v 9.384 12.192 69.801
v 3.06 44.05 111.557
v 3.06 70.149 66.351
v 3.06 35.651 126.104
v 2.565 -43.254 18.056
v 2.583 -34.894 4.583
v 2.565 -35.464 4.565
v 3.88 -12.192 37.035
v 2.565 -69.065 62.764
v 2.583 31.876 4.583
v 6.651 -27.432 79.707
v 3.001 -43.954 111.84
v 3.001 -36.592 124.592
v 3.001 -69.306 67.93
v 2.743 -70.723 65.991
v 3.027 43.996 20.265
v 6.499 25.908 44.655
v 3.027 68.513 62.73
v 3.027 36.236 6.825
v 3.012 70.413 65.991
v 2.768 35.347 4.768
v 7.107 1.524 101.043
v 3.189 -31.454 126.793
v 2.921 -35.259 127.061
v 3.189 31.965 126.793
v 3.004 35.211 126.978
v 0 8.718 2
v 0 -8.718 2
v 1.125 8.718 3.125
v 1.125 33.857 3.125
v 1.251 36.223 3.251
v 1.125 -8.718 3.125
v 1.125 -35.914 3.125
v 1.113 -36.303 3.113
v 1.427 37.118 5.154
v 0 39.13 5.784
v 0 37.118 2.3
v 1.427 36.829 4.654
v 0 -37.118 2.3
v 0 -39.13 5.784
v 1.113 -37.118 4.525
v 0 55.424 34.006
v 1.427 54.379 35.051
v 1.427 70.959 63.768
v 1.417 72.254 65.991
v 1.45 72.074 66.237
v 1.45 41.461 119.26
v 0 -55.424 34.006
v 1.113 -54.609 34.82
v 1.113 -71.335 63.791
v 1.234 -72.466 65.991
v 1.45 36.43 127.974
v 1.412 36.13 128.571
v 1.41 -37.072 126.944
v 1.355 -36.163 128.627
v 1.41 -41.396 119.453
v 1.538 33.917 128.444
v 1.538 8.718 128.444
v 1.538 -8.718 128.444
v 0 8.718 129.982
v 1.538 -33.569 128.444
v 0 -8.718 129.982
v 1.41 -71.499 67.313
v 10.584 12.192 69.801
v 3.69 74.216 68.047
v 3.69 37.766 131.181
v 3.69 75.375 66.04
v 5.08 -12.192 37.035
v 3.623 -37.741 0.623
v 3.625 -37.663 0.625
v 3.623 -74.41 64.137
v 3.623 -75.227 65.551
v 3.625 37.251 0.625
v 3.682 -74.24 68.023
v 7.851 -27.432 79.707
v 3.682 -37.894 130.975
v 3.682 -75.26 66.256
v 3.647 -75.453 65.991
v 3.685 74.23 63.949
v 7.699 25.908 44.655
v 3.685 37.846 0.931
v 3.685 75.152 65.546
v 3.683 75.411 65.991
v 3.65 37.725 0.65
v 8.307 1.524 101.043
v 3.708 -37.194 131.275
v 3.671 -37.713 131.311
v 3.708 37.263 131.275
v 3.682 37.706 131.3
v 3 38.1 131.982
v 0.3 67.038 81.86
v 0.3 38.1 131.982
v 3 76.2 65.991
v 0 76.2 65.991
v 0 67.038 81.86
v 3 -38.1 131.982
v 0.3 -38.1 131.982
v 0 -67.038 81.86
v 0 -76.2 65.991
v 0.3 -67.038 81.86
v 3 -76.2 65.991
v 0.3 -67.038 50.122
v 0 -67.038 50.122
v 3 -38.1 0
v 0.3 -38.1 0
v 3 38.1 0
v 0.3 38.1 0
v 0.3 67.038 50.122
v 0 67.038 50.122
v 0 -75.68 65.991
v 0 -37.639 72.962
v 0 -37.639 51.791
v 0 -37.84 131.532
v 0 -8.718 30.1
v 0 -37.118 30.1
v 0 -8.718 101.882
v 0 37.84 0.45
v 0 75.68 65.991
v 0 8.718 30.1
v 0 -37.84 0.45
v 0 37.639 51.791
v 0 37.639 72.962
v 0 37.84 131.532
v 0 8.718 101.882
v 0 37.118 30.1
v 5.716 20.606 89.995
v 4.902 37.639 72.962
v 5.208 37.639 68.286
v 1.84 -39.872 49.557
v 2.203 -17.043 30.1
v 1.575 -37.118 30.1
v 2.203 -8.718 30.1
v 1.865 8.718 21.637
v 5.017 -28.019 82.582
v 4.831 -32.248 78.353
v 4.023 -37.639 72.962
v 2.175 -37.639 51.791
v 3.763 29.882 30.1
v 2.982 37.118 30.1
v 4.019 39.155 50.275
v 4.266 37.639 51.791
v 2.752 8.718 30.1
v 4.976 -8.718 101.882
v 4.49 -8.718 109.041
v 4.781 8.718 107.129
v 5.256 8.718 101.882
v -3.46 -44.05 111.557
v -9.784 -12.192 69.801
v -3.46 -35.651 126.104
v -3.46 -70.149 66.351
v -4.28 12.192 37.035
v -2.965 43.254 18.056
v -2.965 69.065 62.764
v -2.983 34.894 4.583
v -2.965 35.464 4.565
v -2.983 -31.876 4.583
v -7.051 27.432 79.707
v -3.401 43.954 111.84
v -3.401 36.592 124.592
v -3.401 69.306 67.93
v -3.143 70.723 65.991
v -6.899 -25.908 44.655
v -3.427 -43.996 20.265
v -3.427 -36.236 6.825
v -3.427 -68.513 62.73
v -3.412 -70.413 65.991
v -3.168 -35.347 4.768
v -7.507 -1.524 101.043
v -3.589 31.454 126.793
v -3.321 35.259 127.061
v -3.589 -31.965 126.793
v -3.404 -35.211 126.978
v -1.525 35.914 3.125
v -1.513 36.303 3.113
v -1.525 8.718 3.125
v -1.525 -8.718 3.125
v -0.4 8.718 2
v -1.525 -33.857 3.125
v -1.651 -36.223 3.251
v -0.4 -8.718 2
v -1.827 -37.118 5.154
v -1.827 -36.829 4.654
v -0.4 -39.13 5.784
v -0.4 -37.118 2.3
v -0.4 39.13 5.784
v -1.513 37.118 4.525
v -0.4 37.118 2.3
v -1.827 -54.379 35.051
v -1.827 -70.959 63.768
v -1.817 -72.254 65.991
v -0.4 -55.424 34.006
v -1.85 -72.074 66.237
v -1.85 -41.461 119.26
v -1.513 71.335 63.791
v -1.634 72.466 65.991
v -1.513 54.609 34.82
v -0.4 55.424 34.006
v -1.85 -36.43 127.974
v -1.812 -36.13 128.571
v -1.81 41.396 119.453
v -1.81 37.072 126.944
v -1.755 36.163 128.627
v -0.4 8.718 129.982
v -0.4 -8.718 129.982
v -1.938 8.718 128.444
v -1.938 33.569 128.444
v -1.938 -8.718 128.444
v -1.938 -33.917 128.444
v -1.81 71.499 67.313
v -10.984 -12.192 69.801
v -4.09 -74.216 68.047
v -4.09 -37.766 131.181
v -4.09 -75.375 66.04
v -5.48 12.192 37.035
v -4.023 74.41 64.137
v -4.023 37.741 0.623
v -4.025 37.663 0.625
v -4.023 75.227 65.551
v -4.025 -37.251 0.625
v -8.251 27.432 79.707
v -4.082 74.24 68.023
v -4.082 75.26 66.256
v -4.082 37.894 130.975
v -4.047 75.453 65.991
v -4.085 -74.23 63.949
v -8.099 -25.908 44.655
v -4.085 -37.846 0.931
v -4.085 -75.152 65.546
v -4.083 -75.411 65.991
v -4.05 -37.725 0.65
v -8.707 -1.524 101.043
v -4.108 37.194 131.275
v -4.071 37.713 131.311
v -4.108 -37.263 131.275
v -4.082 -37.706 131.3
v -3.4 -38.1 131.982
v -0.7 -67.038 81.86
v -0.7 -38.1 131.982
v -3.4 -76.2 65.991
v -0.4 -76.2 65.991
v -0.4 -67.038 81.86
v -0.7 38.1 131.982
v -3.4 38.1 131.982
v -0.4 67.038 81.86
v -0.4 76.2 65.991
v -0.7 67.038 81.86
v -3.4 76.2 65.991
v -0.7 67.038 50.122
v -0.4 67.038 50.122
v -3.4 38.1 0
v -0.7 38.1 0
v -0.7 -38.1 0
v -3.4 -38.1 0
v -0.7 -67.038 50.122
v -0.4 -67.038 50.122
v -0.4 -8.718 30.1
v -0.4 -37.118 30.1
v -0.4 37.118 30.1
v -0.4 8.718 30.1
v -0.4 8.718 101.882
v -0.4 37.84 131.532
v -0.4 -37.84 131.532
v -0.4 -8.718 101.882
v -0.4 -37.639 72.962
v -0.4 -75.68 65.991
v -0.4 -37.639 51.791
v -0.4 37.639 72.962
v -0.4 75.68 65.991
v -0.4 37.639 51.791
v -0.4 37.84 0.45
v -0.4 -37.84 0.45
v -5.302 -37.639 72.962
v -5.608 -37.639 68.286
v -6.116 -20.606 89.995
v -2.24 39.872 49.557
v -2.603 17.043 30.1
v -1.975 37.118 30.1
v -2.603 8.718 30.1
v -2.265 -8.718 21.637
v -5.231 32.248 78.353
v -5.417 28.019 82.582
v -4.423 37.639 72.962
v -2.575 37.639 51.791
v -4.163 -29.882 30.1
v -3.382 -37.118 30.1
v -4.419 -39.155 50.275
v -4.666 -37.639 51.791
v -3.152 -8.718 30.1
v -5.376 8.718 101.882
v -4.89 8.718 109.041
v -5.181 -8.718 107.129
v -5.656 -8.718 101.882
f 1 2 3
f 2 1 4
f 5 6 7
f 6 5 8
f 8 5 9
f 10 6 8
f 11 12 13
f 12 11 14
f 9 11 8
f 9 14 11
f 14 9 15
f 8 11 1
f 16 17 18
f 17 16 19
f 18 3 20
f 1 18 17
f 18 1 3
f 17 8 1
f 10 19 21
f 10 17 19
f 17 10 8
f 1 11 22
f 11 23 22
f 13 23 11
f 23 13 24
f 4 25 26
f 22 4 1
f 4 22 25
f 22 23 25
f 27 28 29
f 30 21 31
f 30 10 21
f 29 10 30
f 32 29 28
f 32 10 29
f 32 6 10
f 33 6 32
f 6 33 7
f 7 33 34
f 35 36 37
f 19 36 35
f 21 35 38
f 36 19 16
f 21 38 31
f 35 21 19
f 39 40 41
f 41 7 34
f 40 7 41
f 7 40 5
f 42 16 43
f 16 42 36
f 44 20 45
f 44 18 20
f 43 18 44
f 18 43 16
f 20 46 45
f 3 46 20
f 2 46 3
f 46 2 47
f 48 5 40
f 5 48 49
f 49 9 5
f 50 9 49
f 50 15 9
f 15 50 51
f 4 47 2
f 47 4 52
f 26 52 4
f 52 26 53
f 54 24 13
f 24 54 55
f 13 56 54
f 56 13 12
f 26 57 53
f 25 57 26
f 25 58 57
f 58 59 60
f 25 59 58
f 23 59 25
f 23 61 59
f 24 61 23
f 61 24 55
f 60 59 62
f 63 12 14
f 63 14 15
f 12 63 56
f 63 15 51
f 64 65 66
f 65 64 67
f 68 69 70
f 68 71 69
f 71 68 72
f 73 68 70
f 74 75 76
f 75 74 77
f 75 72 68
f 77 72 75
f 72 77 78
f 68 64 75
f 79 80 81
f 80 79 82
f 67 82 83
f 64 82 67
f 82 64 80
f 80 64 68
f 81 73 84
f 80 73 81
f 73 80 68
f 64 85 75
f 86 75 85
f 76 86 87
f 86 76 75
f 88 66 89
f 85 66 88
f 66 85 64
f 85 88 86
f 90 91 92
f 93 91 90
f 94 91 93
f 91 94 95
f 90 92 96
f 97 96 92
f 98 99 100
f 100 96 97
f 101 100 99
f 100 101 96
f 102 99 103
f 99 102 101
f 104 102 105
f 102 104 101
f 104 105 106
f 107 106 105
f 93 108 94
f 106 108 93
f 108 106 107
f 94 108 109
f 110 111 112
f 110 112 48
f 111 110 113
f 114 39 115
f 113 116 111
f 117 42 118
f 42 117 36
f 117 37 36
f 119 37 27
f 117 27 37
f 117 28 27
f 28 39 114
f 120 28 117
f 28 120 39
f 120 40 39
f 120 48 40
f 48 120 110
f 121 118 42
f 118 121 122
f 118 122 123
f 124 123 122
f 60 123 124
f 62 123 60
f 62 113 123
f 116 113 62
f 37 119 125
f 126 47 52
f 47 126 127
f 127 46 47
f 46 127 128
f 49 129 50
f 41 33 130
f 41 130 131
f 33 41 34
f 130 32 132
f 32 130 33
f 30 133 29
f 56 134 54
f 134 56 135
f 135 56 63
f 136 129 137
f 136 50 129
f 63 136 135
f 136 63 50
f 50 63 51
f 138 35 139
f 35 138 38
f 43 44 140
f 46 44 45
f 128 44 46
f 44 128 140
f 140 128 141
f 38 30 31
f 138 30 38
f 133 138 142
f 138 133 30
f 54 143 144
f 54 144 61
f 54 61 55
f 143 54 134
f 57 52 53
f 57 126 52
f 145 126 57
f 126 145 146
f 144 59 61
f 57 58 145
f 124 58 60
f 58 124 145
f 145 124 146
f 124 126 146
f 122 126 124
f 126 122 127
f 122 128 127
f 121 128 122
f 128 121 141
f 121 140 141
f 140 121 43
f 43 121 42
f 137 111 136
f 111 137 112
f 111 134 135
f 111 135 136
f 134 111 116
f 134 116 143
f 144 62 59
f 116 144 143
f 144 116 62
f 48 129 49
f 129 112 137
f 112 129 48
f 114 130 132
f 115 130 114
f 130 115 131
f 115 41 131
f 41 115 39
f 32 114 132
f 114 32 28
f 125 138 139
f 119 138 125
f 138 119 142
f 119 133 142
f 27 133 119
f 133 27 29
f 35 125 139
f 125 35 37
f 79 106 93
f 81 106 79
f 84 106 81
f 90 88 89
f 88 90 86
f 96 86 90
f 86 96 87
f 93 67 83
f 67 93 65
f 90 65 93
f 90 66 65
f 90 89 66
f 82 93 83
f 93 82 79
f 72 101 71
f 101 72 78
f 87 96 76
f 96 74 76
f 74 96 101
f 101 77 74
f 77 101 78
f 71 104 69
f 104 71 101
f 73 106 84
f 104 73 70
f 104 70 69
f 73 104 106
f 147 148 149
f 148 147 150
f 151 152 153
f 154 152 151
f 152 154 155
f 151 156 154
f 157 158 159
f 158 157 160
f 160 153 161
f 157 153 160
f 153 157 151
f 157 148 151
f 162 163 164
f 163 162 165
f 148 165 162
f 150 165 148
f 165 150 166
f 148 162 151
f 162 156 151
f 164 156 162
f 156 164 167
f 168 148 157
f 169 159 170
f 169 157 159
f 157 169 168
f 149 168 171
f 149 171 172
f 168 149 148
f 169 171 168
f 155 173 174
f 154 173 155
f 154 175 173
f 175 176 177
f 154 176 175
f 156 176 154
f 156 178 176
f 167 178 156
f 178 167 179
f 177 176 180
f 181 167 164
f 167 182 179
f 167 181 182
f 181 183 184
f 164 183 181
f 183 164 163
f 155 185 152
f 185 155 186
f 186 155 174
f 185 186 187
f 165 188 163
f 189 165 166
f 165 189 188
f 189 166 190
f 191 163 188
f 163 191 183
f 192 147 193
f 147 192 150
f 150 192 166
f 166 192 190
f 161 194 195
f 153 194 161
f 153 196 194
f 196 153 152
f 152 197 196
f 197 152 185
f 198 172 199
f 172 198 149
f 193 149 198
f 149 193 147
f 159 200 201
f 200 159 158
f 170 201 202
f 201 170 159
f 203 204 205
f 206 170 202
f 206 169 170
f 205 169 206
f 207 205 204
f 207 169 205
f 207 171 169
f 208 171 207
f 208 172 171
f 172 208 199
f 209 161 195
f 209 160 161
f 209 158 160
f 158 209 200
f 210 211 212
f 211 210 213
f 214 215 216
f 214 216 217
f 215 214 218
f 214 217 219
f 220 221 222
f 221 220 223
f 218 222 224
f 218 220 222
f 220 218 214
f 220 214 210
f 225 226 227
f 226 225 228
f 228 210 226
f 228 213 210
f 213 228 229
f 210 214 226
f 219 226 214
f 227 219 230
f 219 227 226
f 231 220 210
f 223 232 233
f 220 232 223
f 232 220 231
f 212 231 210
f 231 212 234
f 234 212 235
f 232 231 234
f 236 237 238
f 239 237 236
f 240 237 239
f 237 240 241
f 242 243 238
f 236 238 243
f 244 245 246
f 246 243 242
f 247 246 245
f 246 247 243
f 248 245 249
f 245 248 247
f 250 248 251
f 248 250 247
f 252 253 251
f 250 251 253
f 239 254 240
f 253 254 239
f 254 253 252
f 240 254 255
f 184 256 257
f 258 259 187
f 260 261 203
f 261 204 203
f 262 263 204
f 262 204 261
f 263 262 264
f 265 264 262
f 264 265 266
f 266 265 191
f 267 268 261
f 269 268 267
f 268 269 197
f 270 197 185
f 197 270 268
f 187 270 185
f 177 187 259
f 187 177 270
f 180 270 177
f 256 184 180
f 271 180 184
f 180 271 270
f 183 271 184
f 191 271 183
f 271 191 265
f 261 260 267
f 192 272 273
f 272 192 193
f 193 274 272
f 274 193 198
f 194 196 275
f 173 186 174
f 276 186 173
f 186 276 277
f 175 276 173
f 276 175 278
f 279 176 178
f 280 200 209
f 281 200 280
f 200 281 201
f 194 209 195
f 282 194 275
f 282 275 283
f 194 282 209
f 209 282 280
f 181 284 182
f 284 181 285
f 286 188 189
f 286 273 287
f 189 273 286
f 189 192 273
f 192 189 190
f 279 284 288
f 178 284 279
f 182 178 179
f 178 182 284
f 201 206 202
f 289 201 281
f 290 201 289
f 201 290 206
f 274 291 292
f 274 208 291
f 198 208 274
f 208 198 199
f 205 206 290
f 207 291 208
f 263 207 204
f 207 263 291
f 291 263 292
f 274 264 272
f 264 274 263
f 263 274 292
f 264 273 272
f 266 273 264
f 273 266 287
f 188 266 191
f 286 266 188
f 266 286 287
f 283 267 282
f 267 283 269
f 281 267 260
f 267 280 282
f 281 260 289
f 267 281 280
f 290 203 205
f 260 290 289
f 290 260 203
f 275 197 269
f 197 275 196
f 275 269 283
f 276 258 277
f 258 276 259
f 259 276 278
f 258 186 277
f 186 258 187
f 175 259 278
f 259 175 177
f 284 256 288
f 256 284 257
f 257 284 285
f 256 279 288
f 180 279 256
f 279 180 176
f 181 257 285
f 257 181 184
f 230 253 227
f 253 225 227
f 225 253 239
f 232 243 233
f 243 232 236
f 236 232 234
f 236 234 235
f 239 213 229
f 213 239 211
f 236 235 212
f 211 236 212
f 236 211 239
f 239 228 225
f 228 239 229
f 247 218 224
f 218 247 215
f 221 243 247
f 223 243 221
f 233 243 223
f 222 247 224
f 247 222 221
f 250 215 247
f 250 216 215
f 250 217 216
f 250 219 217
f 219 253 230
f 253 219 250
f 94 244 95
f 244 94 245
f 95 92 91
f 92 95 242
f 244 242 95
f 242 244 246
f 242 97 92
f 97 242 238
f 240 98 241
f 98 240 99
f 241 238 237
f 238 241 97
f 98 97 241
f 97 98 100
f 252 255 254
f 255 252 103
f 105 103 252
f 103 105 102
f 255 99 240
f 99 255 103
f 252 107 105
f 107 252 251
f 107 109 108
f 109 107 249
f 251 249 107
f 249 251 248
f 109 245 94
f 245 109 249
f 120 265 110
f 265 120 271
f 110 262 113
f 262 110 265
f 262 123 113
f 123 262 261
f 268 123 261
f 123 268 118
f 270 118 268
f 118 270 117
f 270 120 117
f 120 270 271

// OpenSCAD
// Hexagon wall tile v44 — parametric rebuild of v30
// Front: identical low-poly facets to v30 (same facet angles at every size).
// Edge profile: identical on every size (edge depth, rim width) so tiles butt flush.
// Back: six corner pads for 1" (25 mm) double-sided mounting tape.
// v32: tape pads are flat plates hung from the rim with an air gap to the front skin.
// v33: thinner skin + thinner pads so the air gap is 1.4 mm even right at the edges
//      (v32 had only 0.8 mm there and showed marks along the slanted edges).
// v34: snap-off stabilizer fins behind the bottom edge so the tall, thin tile can't tip over
//      while printing. Break them off afterwards (bend sideways) and the back stays flat.
// v35: 0.6 mm 45° chamfer on the front edge (crisp, consistent shadow line between tiles; hides
//      first-layer squish and brim trim marks) + relief_scale to deepen the facets if wanted.
// v37: much smaller breakaway tabs (0.8 x 0.6 mm, every 8 mm) so the fins snap off easily.
// v38: full-height snap-off BRACE FRAME behind the tile: a thin hex ring + X/vertical bars,
//      1 mm behind the back, tied to the tile rim by tiny tabs all the way round (incl. the top).
//      Tile + brace act as a stiff box while printing; the fins now sit on the brace.
//      Peel the brace off after printing — the tabs only touch the back rim.
// v39: PAIR mode (default): two identical tiles printed back-to-back, 0.4 mm apart, so each
//      cradles the other full-height. Only 12 tiny tabs (corners + mid-sides) join the back
//      rims — twist/peel the tiles apart. No brace, no fins, almost no waste. The pair is
//      turned 90° on the bed so the 'back' seam lands on a side edge, not on either face.
// v40: pair tabs spaced evenly every ~pair_tab_pitch mm round the rim on EVERY size. In v39 the
//      tab spacing grew with the tile (3": ~23 mm max gap, 6": ~46 mm, 10": ~79 mm), so the 3" pair
//      printed perfectly but the 6" rims flexed apart between tabs and broke up above mid-height.
//      Now every size has the same tab spacing as a stiff 3" pair (or tighter).
// v42: tabs replaced by one continuous hairline SEAM round the outer edge of the pair gap.
//      Discrete tabs changed the toolpath on every layer that had a tab, leaving a faint line
//      across the tile every ~10 mm of height. With a continuous seam every layer has the same
//      shape, so there is nothing to print differently. Separate the tiles by running a utility
//      knife along the seam line on the edges, then twist apart.
// v43: stiffer tape pads — each pad now grows from the back plane toward the front until it is
//      pad_gap (1.4 mm) from the skin, instead of being a 1 mm plate (the skin stays untouched, so
//      no ghost lines). Larger tiles (>= mid_pad_min_in)
//      get four extra pads at the slanted mid-edges: 10 tape spots on the 10".
// v44: UNIFORM pads. Every pad is the same PAD x PAD tape square, pushed snug into its corner
//      (touching both rims), with only a small 45° gusset beneath it down to the rim so it prints
//      without support. Because a hex corner is the same angle at every size, the 6" and 10" pads
//      are identical in shape and size; the 3" uses the same layout with smaller squares.
//      The 10" adds the same square at the middle of each slanted edge.
// Prints upright on a flat edge with NO supports (every downward edge is 45° or steeper).
//
// Export one size at a time, e.g.:
//   openscad -D size_in=6 -o hex_pair_v44_6in.stl hex_wall_tile_v44.scad

/* [Size] */
size_in       = 6;      // point-to-point width in inches (3, 6, 10 ...)

/* [Edge profile — keep identical across sizes] */
// Space behind the skin at the edge = edge_depth - skin; it must be >= pad_plate + pad_gap + pad_recess.
edge_depth    = 3.6;    // depth of the outer edge, back plane to front face (mm)
rim           = 2.0;    // perimeter wall thickness at the back plane (mm)
front_chamfer = 0.6;    // 45° chamfer on the front edge (mm); 0 = sharp edge

/* [Look] */
relief_scale  = 1.0;    // 1.0 = v30 facets; 1.5 = 50% deeper facets (same edge profile on all sizes)

/* [Front skin] */
skin          = 1.2;    // front skin thickness (mm) — 3 lines at 0.4 mm, same on all sizes

/* [Tape pads] */
tape_width    = 25.4;   // tape width (mm)
pad_margin    = 3;      // extra pad width beyond the tape (mm)
pad_max_frac  = 0.45;   // pad never larger than this fraction of the tile radius (keeps 3" usable)
pad_plate     = 1.0;    // minimum pad thickness (mm) — at the very edge, where there is least room
pad_depth     = 7;      // pads grow toward the front up to this depth, but always stop pad_gap from the skin
mid_pad_min_in = 8;     // tiles this size or larger also get pads at the four slanted mid-edges
pad_gap       = 1.4;    // minimum air gap between pads and the front skin (mm) — keeps the front clean
pad_recess    = 0;      // pads set back from the rim (mm); >0 lets the rim touch the wall,
                        // but near the edges the plate is then trimmed thinner to keep pad_gap

/* [Print stabilizers (snap off after printing)] */
stabilizers   = false;  // v34-v38 option; not needed in pair mode
fin_count     = 2;      // fins behind the bottom edge, placed symmetrically
fin_thick     = 1.6;    // fin thickness (mm)
fin_height_frac = 0.35; // fin height as a fraction of the tile height
fin_depth_frac  = 0.4;  // fin depth behind the brace as a fraction of fin height
fin_depth_min   = 15;   // (mm)
fin_gap       = 0.5;    // air gap between fin and tile back (mm)
tab_height    = 0.6;    // breakaway tab height (mm, vertical when printing) — 3 layers at 0.2
tab_width     = 0.8;    // breakaway tab width (mm), centred on the fin — 2 lines
tab_pitch     = 8;      // spacing between tabs (mm)

/* [Full-height brace frame (snap off after printing)] */
brace         = false;  // v38 option; not needed in pair mode
brace_gap     = 1.0;    // air gap between tile back and brace (mm)
brace_thick   = 1.6;    // brace thickness (mm)
brace_rim_w   = 4;      // width of the brace's hex ring (mm)
brace_bar_w   = 3;      // width of the X and vertical bars (mm)
brace_tab_pitch = 10;   // spacing of brace tabs along each rim side (mm)
brace_tab     = 0.8;    // brace tab size (mm) — tiny, so the brace peels off

/* [Back-to-back pair (default)] */
pair          = true;
pair_gap      = 0.4;    // gap between the two back planes (mm): close enough to cradle, not fused
pair_tab      = 0.6;    // tab size (mm) — tiny, so the pair twists apart
pair_tab_pitch = 12;    // (v40 tabs, unused when pair_seam_w > 0)
pair_seam_w   = 0.45;   // width of the continuous edge seam bridging the gap (mm) — about one line

/* [Output] */
orient_for_print = true; // stand upright on a flat edge, back facing +Y

/* [Hidden] */
R   = size_in * 25.4 / 2;         // corner radius
AP  = R * cos(30);                // apothem
PAD = min(tape_width + pad_margin, R * pad_max_frac);

// Normalised front geometry from v30 (x, y in units of R; z = relief above edge, units of R)
FP = [[1,0,0],[0.5,0.866025,0],[-0.5,0.866025,0],[-1,0,0],[-0.5,-0.866025,0],[0.5,-0.866025,0],
      [0.16,0.05,0.091654],[-0.16,-0.38,0.019428],[-0.36,0.18,0.05579],[0.34,-0.28,0.053795],[0.02,0.46,0.061766]];
FACES = [[0,6,1],[4,3,7],[5,4,7],[8,3,2],[7,3,8],[7,8,6],[5,9,0],[9,6,0],[9,7,6],[5,7,9],
         [6,8,10],[8,2,10],[6,10,1],[10,2,1],
         [1,12,11,0],[2,13,12,1],[3,14,13,2],[4,15,14,3],[5,16,15,4],[0,11,16,5],
         [11,12,13,14,15,16]];
RELIEF_MAX = 0.091654 * R * relief_scale;
D = edge_depth + RELIEF_MAX + 1;  // max depth used for chamfers

// Solid bounded by the faceted front (shifted by dz) and a flat back at z = zb
module body(dz = 0, zb = 0) {
    pts = concat(
        [for (p = FP) [p[0]*R, p[1]*R, edge_depth + p[2]*R*relief_scale + dz]],
        [for (i = [0:5]) [FP[i][0]*R, FP[i][1]*R, zb]]);
    polyhedron(points = pts, faces = FACES, convexity = 4);
}

module hex2d(apothem) { circle(r = apothem / cos(30), $fn = 6); }

// Back cavity: behind the skin, inside the rim; rim inner faces slope 45° so nothing needs support
module cavity(extra = 0) {
    H  = D + 2;
    a0 = AP - rim - extra + 1;             // apothem at z = -1
    intersection() {
        body(dz = -skin - extra, zb = -1);
        translate([0, 0, -1]) linear_extrude(height = H, scale = (a0 - H) / a0) hex2d(a0);
    }
}

// ---- Uniform tape pads ----------------------------------------------------------------
PA = AP - rim + 0.3;                    // inner apothem used for pads (0.3 mm overlap fuses them to the rim)
PH = PAD / 2;
function nrm(a) = [cos(a), sin(a)];
function lim(a) = PA - PH * (abs(cos(a)) + abs(sin(a)));     // max n.c for an axis-aligned PAD square
// centre of a PAD square snug in the corner at angle t (touches the two rims meeting there)
function corner_c(t) = let(n1 = nrm(t - 30), n2 = nrm(t + 30), b1 = lim(t - 30), b2 = lim(t + 30), d = sin(60))
    [(b1*n2[1] - b2*n1[1]) / d, (n1[0]*b2 - n2[0]*b1) / d];
// centre of a PAD square snug against the middle of the edge whose normal is at angle a
function edge_c(a) = lim(a) * nrm(a);
// downward 45° (or vertical) gusset direction toward the nearest rim below — printed upright, model -y is down
function gdir(t) = (cos(t) > 0.1) ? [1, -1] : (cos(t) < -0.1) ? [-1, -1] : [0, -1];

module pad_sq(c, dir) {
    intersection() {
        hex2d(PA);
        hull() { translate(c) square(PAD, center = true); translate(c + dir * R) square(PAD, center = true); }
    }
}
module pad_fp(k)  { t = 60*k;      pad_sq(corner_c(t), (k == 4 || k == 5) ? [0, -1] : gdir(t)); }
module mid_fp(k)  { a = 30 + 60*k; pad_sq(edge_c(a),   (k == 3 || k == 5) ? [0, -1] : gdir(a)); }

module pads() {
    intersection() {
        body(dz = -skin - pad_gap, zb = -1);       // never closer than pad_gap to the skin
        translate([0, 0, pad_recess]) linear_extrude(max(pad_plate, pad_depth)) {
            for (k = [0:5]) pad_fp(k);
            if (size_in >= mid_pad_min_in) for (k = [0, 2, 3, 5]) mid_fp(k);
        }
    }
}

module chamfer_clip() {
    HB = D + 5;
    union() {
        translate([0, 0, -2]) linear_extrude(edge_depth - front_chamfer + 2) hex2d(AP + 1);
        translate([0, 0, edge_depth - front_chamfer]) linear_extrude(height = HB, scale = (AP - HB) / AP) hex2d(AP);
    }
}

module tile() {
    intersection() {
        union() {
            difference() { body(); cavity(); }
            pads();
        }
        if (front_chamfer > 0) chamfer_clip(); else translate([-2*R, -2*R, -5]) cube([4*R, 4*R, 4*R]);
    }
}

// Triangular fins standing on the bed behind the back (model z < 0), joined to the tile by small tabs
FIN_H = fin_height_frac * 2 * AP;
FIN_L = max(fin_depth_min, fin_depth_frac * FIN_H);
function fin_x(i) = (fin_count == 1) ? 0 : (-1 + 2 * i / (fin_count - 1)) * 0.35 * R;
BZ = brace ? brace_gap + brace_thick : 0;          // fins start behind the brace when it is used
module stabilizer_fins() {
    for (i = [0 : fin_count - 1]) {
        x = fin_x(i);
        fg = brace ? BZ - 0.3 : fin_gap;                // with a brace: fused into it (no tabs needed)
        hull() {                                            // fin: vertical triangle
            translate([x - fin_thick/2, -AP, -fg - FIN_L]) cube([fin_thick, 0.01, FIN_L]);
            translate([x - fin_thick/2, -AP, -fg - 0.01]) cube([fin_thick, FIN_H, 0.01]);
        }
        if (!brace)
            for (y = [0 : tab_pitch : FIN_H - tab_height])  // breakaway tabs into the back plane
                translate([x - tab_width/2, -AP + y, -fin_gap - 0.05]) cube([tab_width, tab_height, fin_gap + 0.35]);
    }
}

// Brace frame (2D, in the tile plane). Printed upright, so every downward-facing edge is >= 45°:
// the top bar is carried by 45° roofs in the two top windows; bars run vertical or at ±60°.
module brace_2d() {
    W  = brace_rim_w;
    Yt = AP - W;                                        // underside of the top ring bar
    difference() {
        hex2d(AP);
        intersection() {                                // the open window, with a 45° roof under the top bar
            hex2d(AP - W);
            // only the two top windows touch the top bar: give them a 45° valley roof
            polygon([[-2*R, -2*R], [2*R, -2*R], [2*R, 2*R], [R/2, 2*R], [R/2, Yt],
                     [0, Yt - R/2], [-R/2, Yt], [-R/2, 2*R], [-2*R, 2*R]]);
        }
    }
    intersection() {
        hex2d(AP);
        union() {
            square([brace_bar_w, 2*AP], center = true);                 // vertical bar
            rotate(60)  square([4*R, brace_bar_w], center = true);      // ±60° diagonals (corner to corner)
            rotate(-60) square([4*R, brace_bar_w], center = true);
        }
    }
}

module brace_frame() {
    translate([0, 0, -BZ]) linear_extrude(brace_thick) brace_2d();
    // tiny tabs across the gap, on the tile's back rim (1 mm in from the outline), all six sides
    for (k = [0:5]) {
        a0 = 60*k; a1 = 60*(k+1);
        p0 = [ (R - 1/sin(60)) * cos(a0), (R - 1/sin(60)) * sin(a0) ];
        p1 = [ (R - 1/sin(60)) * cos(a1), (R - 1/sin(60)) * sin(a1) ];
        L  = norm(p1 - p0);
        n  = floor((L - 6) / brace_tab_pitch);
        for (j = [0 : n]) {
            t = (3 + j * (L - 6) / max(n, 1)) / L;
            p = p0 + t * (p1 - p0);
            translate([p[0], p[1], -brace_gap - 0.3]) rotate(a0 + 120)
                translate([-brace_tab/2, -brace_tab/2, 0]) cube([brace_tab, brace_tab, brace_gap + 0.6]);
        }
    }
}

// Tabs across the pair gap, evenly spaced along each rim side (1 mm in from the outline)
module pair_tabs() {
    rr = R - 1/sin(60);
    n  = max(2, ceil(rr / pair_tab_pitch));          // side length = rr
    for (k = [0:5]) for (i = [0:n-1]) {
        f  = (i + 0.5) / n;
        a0 = 60*k; a1 = 60*(k+1);
        p = [rr*cos(a0), rr*sin(a0)] + f * ([rr*cos(a1), rr*sin(a1)] - [rr*cos(a0), rr*sin(a0)]);
        translate([p[0], p[1], -pair_gap - 0.3]) rotate(a0 + 120)
            translate([-pair_tab/2, -pair_tab/2, 0]) cube([pair_tab, pair_tab, pair_gap + 0.6]);
    }
}
// Continuous hairline seam round the outline, bridging the gap between the two back planes
module pair_seam() {
    translate([0, 0, -pair_gap - 0.3]) linear_extrude(pair_gap + 0.6)
        difference() { hex2d(AP); hex2d(AP - pair_seam_w); }
}
module partner() { translate([0, 0, -pair_gap]) rotate([0, 180, 0]) tile(); }   // same tile turned round, not mirrored

module assembly() {
    tile();
    if (pair) { partner(); if (pair_seam_w > 0) pair_seam(); else pair_tabs(); }
    else { if (brace) brace_frame(); if (stabilizers) stabilizer_fins(); }
}

if (orient_for_print)
    rotate([0, 0, pair ? 90 : 0]) translate([0, 0, AP]) rotate([90, 0, 0]) assembly();
else
    assembly();
